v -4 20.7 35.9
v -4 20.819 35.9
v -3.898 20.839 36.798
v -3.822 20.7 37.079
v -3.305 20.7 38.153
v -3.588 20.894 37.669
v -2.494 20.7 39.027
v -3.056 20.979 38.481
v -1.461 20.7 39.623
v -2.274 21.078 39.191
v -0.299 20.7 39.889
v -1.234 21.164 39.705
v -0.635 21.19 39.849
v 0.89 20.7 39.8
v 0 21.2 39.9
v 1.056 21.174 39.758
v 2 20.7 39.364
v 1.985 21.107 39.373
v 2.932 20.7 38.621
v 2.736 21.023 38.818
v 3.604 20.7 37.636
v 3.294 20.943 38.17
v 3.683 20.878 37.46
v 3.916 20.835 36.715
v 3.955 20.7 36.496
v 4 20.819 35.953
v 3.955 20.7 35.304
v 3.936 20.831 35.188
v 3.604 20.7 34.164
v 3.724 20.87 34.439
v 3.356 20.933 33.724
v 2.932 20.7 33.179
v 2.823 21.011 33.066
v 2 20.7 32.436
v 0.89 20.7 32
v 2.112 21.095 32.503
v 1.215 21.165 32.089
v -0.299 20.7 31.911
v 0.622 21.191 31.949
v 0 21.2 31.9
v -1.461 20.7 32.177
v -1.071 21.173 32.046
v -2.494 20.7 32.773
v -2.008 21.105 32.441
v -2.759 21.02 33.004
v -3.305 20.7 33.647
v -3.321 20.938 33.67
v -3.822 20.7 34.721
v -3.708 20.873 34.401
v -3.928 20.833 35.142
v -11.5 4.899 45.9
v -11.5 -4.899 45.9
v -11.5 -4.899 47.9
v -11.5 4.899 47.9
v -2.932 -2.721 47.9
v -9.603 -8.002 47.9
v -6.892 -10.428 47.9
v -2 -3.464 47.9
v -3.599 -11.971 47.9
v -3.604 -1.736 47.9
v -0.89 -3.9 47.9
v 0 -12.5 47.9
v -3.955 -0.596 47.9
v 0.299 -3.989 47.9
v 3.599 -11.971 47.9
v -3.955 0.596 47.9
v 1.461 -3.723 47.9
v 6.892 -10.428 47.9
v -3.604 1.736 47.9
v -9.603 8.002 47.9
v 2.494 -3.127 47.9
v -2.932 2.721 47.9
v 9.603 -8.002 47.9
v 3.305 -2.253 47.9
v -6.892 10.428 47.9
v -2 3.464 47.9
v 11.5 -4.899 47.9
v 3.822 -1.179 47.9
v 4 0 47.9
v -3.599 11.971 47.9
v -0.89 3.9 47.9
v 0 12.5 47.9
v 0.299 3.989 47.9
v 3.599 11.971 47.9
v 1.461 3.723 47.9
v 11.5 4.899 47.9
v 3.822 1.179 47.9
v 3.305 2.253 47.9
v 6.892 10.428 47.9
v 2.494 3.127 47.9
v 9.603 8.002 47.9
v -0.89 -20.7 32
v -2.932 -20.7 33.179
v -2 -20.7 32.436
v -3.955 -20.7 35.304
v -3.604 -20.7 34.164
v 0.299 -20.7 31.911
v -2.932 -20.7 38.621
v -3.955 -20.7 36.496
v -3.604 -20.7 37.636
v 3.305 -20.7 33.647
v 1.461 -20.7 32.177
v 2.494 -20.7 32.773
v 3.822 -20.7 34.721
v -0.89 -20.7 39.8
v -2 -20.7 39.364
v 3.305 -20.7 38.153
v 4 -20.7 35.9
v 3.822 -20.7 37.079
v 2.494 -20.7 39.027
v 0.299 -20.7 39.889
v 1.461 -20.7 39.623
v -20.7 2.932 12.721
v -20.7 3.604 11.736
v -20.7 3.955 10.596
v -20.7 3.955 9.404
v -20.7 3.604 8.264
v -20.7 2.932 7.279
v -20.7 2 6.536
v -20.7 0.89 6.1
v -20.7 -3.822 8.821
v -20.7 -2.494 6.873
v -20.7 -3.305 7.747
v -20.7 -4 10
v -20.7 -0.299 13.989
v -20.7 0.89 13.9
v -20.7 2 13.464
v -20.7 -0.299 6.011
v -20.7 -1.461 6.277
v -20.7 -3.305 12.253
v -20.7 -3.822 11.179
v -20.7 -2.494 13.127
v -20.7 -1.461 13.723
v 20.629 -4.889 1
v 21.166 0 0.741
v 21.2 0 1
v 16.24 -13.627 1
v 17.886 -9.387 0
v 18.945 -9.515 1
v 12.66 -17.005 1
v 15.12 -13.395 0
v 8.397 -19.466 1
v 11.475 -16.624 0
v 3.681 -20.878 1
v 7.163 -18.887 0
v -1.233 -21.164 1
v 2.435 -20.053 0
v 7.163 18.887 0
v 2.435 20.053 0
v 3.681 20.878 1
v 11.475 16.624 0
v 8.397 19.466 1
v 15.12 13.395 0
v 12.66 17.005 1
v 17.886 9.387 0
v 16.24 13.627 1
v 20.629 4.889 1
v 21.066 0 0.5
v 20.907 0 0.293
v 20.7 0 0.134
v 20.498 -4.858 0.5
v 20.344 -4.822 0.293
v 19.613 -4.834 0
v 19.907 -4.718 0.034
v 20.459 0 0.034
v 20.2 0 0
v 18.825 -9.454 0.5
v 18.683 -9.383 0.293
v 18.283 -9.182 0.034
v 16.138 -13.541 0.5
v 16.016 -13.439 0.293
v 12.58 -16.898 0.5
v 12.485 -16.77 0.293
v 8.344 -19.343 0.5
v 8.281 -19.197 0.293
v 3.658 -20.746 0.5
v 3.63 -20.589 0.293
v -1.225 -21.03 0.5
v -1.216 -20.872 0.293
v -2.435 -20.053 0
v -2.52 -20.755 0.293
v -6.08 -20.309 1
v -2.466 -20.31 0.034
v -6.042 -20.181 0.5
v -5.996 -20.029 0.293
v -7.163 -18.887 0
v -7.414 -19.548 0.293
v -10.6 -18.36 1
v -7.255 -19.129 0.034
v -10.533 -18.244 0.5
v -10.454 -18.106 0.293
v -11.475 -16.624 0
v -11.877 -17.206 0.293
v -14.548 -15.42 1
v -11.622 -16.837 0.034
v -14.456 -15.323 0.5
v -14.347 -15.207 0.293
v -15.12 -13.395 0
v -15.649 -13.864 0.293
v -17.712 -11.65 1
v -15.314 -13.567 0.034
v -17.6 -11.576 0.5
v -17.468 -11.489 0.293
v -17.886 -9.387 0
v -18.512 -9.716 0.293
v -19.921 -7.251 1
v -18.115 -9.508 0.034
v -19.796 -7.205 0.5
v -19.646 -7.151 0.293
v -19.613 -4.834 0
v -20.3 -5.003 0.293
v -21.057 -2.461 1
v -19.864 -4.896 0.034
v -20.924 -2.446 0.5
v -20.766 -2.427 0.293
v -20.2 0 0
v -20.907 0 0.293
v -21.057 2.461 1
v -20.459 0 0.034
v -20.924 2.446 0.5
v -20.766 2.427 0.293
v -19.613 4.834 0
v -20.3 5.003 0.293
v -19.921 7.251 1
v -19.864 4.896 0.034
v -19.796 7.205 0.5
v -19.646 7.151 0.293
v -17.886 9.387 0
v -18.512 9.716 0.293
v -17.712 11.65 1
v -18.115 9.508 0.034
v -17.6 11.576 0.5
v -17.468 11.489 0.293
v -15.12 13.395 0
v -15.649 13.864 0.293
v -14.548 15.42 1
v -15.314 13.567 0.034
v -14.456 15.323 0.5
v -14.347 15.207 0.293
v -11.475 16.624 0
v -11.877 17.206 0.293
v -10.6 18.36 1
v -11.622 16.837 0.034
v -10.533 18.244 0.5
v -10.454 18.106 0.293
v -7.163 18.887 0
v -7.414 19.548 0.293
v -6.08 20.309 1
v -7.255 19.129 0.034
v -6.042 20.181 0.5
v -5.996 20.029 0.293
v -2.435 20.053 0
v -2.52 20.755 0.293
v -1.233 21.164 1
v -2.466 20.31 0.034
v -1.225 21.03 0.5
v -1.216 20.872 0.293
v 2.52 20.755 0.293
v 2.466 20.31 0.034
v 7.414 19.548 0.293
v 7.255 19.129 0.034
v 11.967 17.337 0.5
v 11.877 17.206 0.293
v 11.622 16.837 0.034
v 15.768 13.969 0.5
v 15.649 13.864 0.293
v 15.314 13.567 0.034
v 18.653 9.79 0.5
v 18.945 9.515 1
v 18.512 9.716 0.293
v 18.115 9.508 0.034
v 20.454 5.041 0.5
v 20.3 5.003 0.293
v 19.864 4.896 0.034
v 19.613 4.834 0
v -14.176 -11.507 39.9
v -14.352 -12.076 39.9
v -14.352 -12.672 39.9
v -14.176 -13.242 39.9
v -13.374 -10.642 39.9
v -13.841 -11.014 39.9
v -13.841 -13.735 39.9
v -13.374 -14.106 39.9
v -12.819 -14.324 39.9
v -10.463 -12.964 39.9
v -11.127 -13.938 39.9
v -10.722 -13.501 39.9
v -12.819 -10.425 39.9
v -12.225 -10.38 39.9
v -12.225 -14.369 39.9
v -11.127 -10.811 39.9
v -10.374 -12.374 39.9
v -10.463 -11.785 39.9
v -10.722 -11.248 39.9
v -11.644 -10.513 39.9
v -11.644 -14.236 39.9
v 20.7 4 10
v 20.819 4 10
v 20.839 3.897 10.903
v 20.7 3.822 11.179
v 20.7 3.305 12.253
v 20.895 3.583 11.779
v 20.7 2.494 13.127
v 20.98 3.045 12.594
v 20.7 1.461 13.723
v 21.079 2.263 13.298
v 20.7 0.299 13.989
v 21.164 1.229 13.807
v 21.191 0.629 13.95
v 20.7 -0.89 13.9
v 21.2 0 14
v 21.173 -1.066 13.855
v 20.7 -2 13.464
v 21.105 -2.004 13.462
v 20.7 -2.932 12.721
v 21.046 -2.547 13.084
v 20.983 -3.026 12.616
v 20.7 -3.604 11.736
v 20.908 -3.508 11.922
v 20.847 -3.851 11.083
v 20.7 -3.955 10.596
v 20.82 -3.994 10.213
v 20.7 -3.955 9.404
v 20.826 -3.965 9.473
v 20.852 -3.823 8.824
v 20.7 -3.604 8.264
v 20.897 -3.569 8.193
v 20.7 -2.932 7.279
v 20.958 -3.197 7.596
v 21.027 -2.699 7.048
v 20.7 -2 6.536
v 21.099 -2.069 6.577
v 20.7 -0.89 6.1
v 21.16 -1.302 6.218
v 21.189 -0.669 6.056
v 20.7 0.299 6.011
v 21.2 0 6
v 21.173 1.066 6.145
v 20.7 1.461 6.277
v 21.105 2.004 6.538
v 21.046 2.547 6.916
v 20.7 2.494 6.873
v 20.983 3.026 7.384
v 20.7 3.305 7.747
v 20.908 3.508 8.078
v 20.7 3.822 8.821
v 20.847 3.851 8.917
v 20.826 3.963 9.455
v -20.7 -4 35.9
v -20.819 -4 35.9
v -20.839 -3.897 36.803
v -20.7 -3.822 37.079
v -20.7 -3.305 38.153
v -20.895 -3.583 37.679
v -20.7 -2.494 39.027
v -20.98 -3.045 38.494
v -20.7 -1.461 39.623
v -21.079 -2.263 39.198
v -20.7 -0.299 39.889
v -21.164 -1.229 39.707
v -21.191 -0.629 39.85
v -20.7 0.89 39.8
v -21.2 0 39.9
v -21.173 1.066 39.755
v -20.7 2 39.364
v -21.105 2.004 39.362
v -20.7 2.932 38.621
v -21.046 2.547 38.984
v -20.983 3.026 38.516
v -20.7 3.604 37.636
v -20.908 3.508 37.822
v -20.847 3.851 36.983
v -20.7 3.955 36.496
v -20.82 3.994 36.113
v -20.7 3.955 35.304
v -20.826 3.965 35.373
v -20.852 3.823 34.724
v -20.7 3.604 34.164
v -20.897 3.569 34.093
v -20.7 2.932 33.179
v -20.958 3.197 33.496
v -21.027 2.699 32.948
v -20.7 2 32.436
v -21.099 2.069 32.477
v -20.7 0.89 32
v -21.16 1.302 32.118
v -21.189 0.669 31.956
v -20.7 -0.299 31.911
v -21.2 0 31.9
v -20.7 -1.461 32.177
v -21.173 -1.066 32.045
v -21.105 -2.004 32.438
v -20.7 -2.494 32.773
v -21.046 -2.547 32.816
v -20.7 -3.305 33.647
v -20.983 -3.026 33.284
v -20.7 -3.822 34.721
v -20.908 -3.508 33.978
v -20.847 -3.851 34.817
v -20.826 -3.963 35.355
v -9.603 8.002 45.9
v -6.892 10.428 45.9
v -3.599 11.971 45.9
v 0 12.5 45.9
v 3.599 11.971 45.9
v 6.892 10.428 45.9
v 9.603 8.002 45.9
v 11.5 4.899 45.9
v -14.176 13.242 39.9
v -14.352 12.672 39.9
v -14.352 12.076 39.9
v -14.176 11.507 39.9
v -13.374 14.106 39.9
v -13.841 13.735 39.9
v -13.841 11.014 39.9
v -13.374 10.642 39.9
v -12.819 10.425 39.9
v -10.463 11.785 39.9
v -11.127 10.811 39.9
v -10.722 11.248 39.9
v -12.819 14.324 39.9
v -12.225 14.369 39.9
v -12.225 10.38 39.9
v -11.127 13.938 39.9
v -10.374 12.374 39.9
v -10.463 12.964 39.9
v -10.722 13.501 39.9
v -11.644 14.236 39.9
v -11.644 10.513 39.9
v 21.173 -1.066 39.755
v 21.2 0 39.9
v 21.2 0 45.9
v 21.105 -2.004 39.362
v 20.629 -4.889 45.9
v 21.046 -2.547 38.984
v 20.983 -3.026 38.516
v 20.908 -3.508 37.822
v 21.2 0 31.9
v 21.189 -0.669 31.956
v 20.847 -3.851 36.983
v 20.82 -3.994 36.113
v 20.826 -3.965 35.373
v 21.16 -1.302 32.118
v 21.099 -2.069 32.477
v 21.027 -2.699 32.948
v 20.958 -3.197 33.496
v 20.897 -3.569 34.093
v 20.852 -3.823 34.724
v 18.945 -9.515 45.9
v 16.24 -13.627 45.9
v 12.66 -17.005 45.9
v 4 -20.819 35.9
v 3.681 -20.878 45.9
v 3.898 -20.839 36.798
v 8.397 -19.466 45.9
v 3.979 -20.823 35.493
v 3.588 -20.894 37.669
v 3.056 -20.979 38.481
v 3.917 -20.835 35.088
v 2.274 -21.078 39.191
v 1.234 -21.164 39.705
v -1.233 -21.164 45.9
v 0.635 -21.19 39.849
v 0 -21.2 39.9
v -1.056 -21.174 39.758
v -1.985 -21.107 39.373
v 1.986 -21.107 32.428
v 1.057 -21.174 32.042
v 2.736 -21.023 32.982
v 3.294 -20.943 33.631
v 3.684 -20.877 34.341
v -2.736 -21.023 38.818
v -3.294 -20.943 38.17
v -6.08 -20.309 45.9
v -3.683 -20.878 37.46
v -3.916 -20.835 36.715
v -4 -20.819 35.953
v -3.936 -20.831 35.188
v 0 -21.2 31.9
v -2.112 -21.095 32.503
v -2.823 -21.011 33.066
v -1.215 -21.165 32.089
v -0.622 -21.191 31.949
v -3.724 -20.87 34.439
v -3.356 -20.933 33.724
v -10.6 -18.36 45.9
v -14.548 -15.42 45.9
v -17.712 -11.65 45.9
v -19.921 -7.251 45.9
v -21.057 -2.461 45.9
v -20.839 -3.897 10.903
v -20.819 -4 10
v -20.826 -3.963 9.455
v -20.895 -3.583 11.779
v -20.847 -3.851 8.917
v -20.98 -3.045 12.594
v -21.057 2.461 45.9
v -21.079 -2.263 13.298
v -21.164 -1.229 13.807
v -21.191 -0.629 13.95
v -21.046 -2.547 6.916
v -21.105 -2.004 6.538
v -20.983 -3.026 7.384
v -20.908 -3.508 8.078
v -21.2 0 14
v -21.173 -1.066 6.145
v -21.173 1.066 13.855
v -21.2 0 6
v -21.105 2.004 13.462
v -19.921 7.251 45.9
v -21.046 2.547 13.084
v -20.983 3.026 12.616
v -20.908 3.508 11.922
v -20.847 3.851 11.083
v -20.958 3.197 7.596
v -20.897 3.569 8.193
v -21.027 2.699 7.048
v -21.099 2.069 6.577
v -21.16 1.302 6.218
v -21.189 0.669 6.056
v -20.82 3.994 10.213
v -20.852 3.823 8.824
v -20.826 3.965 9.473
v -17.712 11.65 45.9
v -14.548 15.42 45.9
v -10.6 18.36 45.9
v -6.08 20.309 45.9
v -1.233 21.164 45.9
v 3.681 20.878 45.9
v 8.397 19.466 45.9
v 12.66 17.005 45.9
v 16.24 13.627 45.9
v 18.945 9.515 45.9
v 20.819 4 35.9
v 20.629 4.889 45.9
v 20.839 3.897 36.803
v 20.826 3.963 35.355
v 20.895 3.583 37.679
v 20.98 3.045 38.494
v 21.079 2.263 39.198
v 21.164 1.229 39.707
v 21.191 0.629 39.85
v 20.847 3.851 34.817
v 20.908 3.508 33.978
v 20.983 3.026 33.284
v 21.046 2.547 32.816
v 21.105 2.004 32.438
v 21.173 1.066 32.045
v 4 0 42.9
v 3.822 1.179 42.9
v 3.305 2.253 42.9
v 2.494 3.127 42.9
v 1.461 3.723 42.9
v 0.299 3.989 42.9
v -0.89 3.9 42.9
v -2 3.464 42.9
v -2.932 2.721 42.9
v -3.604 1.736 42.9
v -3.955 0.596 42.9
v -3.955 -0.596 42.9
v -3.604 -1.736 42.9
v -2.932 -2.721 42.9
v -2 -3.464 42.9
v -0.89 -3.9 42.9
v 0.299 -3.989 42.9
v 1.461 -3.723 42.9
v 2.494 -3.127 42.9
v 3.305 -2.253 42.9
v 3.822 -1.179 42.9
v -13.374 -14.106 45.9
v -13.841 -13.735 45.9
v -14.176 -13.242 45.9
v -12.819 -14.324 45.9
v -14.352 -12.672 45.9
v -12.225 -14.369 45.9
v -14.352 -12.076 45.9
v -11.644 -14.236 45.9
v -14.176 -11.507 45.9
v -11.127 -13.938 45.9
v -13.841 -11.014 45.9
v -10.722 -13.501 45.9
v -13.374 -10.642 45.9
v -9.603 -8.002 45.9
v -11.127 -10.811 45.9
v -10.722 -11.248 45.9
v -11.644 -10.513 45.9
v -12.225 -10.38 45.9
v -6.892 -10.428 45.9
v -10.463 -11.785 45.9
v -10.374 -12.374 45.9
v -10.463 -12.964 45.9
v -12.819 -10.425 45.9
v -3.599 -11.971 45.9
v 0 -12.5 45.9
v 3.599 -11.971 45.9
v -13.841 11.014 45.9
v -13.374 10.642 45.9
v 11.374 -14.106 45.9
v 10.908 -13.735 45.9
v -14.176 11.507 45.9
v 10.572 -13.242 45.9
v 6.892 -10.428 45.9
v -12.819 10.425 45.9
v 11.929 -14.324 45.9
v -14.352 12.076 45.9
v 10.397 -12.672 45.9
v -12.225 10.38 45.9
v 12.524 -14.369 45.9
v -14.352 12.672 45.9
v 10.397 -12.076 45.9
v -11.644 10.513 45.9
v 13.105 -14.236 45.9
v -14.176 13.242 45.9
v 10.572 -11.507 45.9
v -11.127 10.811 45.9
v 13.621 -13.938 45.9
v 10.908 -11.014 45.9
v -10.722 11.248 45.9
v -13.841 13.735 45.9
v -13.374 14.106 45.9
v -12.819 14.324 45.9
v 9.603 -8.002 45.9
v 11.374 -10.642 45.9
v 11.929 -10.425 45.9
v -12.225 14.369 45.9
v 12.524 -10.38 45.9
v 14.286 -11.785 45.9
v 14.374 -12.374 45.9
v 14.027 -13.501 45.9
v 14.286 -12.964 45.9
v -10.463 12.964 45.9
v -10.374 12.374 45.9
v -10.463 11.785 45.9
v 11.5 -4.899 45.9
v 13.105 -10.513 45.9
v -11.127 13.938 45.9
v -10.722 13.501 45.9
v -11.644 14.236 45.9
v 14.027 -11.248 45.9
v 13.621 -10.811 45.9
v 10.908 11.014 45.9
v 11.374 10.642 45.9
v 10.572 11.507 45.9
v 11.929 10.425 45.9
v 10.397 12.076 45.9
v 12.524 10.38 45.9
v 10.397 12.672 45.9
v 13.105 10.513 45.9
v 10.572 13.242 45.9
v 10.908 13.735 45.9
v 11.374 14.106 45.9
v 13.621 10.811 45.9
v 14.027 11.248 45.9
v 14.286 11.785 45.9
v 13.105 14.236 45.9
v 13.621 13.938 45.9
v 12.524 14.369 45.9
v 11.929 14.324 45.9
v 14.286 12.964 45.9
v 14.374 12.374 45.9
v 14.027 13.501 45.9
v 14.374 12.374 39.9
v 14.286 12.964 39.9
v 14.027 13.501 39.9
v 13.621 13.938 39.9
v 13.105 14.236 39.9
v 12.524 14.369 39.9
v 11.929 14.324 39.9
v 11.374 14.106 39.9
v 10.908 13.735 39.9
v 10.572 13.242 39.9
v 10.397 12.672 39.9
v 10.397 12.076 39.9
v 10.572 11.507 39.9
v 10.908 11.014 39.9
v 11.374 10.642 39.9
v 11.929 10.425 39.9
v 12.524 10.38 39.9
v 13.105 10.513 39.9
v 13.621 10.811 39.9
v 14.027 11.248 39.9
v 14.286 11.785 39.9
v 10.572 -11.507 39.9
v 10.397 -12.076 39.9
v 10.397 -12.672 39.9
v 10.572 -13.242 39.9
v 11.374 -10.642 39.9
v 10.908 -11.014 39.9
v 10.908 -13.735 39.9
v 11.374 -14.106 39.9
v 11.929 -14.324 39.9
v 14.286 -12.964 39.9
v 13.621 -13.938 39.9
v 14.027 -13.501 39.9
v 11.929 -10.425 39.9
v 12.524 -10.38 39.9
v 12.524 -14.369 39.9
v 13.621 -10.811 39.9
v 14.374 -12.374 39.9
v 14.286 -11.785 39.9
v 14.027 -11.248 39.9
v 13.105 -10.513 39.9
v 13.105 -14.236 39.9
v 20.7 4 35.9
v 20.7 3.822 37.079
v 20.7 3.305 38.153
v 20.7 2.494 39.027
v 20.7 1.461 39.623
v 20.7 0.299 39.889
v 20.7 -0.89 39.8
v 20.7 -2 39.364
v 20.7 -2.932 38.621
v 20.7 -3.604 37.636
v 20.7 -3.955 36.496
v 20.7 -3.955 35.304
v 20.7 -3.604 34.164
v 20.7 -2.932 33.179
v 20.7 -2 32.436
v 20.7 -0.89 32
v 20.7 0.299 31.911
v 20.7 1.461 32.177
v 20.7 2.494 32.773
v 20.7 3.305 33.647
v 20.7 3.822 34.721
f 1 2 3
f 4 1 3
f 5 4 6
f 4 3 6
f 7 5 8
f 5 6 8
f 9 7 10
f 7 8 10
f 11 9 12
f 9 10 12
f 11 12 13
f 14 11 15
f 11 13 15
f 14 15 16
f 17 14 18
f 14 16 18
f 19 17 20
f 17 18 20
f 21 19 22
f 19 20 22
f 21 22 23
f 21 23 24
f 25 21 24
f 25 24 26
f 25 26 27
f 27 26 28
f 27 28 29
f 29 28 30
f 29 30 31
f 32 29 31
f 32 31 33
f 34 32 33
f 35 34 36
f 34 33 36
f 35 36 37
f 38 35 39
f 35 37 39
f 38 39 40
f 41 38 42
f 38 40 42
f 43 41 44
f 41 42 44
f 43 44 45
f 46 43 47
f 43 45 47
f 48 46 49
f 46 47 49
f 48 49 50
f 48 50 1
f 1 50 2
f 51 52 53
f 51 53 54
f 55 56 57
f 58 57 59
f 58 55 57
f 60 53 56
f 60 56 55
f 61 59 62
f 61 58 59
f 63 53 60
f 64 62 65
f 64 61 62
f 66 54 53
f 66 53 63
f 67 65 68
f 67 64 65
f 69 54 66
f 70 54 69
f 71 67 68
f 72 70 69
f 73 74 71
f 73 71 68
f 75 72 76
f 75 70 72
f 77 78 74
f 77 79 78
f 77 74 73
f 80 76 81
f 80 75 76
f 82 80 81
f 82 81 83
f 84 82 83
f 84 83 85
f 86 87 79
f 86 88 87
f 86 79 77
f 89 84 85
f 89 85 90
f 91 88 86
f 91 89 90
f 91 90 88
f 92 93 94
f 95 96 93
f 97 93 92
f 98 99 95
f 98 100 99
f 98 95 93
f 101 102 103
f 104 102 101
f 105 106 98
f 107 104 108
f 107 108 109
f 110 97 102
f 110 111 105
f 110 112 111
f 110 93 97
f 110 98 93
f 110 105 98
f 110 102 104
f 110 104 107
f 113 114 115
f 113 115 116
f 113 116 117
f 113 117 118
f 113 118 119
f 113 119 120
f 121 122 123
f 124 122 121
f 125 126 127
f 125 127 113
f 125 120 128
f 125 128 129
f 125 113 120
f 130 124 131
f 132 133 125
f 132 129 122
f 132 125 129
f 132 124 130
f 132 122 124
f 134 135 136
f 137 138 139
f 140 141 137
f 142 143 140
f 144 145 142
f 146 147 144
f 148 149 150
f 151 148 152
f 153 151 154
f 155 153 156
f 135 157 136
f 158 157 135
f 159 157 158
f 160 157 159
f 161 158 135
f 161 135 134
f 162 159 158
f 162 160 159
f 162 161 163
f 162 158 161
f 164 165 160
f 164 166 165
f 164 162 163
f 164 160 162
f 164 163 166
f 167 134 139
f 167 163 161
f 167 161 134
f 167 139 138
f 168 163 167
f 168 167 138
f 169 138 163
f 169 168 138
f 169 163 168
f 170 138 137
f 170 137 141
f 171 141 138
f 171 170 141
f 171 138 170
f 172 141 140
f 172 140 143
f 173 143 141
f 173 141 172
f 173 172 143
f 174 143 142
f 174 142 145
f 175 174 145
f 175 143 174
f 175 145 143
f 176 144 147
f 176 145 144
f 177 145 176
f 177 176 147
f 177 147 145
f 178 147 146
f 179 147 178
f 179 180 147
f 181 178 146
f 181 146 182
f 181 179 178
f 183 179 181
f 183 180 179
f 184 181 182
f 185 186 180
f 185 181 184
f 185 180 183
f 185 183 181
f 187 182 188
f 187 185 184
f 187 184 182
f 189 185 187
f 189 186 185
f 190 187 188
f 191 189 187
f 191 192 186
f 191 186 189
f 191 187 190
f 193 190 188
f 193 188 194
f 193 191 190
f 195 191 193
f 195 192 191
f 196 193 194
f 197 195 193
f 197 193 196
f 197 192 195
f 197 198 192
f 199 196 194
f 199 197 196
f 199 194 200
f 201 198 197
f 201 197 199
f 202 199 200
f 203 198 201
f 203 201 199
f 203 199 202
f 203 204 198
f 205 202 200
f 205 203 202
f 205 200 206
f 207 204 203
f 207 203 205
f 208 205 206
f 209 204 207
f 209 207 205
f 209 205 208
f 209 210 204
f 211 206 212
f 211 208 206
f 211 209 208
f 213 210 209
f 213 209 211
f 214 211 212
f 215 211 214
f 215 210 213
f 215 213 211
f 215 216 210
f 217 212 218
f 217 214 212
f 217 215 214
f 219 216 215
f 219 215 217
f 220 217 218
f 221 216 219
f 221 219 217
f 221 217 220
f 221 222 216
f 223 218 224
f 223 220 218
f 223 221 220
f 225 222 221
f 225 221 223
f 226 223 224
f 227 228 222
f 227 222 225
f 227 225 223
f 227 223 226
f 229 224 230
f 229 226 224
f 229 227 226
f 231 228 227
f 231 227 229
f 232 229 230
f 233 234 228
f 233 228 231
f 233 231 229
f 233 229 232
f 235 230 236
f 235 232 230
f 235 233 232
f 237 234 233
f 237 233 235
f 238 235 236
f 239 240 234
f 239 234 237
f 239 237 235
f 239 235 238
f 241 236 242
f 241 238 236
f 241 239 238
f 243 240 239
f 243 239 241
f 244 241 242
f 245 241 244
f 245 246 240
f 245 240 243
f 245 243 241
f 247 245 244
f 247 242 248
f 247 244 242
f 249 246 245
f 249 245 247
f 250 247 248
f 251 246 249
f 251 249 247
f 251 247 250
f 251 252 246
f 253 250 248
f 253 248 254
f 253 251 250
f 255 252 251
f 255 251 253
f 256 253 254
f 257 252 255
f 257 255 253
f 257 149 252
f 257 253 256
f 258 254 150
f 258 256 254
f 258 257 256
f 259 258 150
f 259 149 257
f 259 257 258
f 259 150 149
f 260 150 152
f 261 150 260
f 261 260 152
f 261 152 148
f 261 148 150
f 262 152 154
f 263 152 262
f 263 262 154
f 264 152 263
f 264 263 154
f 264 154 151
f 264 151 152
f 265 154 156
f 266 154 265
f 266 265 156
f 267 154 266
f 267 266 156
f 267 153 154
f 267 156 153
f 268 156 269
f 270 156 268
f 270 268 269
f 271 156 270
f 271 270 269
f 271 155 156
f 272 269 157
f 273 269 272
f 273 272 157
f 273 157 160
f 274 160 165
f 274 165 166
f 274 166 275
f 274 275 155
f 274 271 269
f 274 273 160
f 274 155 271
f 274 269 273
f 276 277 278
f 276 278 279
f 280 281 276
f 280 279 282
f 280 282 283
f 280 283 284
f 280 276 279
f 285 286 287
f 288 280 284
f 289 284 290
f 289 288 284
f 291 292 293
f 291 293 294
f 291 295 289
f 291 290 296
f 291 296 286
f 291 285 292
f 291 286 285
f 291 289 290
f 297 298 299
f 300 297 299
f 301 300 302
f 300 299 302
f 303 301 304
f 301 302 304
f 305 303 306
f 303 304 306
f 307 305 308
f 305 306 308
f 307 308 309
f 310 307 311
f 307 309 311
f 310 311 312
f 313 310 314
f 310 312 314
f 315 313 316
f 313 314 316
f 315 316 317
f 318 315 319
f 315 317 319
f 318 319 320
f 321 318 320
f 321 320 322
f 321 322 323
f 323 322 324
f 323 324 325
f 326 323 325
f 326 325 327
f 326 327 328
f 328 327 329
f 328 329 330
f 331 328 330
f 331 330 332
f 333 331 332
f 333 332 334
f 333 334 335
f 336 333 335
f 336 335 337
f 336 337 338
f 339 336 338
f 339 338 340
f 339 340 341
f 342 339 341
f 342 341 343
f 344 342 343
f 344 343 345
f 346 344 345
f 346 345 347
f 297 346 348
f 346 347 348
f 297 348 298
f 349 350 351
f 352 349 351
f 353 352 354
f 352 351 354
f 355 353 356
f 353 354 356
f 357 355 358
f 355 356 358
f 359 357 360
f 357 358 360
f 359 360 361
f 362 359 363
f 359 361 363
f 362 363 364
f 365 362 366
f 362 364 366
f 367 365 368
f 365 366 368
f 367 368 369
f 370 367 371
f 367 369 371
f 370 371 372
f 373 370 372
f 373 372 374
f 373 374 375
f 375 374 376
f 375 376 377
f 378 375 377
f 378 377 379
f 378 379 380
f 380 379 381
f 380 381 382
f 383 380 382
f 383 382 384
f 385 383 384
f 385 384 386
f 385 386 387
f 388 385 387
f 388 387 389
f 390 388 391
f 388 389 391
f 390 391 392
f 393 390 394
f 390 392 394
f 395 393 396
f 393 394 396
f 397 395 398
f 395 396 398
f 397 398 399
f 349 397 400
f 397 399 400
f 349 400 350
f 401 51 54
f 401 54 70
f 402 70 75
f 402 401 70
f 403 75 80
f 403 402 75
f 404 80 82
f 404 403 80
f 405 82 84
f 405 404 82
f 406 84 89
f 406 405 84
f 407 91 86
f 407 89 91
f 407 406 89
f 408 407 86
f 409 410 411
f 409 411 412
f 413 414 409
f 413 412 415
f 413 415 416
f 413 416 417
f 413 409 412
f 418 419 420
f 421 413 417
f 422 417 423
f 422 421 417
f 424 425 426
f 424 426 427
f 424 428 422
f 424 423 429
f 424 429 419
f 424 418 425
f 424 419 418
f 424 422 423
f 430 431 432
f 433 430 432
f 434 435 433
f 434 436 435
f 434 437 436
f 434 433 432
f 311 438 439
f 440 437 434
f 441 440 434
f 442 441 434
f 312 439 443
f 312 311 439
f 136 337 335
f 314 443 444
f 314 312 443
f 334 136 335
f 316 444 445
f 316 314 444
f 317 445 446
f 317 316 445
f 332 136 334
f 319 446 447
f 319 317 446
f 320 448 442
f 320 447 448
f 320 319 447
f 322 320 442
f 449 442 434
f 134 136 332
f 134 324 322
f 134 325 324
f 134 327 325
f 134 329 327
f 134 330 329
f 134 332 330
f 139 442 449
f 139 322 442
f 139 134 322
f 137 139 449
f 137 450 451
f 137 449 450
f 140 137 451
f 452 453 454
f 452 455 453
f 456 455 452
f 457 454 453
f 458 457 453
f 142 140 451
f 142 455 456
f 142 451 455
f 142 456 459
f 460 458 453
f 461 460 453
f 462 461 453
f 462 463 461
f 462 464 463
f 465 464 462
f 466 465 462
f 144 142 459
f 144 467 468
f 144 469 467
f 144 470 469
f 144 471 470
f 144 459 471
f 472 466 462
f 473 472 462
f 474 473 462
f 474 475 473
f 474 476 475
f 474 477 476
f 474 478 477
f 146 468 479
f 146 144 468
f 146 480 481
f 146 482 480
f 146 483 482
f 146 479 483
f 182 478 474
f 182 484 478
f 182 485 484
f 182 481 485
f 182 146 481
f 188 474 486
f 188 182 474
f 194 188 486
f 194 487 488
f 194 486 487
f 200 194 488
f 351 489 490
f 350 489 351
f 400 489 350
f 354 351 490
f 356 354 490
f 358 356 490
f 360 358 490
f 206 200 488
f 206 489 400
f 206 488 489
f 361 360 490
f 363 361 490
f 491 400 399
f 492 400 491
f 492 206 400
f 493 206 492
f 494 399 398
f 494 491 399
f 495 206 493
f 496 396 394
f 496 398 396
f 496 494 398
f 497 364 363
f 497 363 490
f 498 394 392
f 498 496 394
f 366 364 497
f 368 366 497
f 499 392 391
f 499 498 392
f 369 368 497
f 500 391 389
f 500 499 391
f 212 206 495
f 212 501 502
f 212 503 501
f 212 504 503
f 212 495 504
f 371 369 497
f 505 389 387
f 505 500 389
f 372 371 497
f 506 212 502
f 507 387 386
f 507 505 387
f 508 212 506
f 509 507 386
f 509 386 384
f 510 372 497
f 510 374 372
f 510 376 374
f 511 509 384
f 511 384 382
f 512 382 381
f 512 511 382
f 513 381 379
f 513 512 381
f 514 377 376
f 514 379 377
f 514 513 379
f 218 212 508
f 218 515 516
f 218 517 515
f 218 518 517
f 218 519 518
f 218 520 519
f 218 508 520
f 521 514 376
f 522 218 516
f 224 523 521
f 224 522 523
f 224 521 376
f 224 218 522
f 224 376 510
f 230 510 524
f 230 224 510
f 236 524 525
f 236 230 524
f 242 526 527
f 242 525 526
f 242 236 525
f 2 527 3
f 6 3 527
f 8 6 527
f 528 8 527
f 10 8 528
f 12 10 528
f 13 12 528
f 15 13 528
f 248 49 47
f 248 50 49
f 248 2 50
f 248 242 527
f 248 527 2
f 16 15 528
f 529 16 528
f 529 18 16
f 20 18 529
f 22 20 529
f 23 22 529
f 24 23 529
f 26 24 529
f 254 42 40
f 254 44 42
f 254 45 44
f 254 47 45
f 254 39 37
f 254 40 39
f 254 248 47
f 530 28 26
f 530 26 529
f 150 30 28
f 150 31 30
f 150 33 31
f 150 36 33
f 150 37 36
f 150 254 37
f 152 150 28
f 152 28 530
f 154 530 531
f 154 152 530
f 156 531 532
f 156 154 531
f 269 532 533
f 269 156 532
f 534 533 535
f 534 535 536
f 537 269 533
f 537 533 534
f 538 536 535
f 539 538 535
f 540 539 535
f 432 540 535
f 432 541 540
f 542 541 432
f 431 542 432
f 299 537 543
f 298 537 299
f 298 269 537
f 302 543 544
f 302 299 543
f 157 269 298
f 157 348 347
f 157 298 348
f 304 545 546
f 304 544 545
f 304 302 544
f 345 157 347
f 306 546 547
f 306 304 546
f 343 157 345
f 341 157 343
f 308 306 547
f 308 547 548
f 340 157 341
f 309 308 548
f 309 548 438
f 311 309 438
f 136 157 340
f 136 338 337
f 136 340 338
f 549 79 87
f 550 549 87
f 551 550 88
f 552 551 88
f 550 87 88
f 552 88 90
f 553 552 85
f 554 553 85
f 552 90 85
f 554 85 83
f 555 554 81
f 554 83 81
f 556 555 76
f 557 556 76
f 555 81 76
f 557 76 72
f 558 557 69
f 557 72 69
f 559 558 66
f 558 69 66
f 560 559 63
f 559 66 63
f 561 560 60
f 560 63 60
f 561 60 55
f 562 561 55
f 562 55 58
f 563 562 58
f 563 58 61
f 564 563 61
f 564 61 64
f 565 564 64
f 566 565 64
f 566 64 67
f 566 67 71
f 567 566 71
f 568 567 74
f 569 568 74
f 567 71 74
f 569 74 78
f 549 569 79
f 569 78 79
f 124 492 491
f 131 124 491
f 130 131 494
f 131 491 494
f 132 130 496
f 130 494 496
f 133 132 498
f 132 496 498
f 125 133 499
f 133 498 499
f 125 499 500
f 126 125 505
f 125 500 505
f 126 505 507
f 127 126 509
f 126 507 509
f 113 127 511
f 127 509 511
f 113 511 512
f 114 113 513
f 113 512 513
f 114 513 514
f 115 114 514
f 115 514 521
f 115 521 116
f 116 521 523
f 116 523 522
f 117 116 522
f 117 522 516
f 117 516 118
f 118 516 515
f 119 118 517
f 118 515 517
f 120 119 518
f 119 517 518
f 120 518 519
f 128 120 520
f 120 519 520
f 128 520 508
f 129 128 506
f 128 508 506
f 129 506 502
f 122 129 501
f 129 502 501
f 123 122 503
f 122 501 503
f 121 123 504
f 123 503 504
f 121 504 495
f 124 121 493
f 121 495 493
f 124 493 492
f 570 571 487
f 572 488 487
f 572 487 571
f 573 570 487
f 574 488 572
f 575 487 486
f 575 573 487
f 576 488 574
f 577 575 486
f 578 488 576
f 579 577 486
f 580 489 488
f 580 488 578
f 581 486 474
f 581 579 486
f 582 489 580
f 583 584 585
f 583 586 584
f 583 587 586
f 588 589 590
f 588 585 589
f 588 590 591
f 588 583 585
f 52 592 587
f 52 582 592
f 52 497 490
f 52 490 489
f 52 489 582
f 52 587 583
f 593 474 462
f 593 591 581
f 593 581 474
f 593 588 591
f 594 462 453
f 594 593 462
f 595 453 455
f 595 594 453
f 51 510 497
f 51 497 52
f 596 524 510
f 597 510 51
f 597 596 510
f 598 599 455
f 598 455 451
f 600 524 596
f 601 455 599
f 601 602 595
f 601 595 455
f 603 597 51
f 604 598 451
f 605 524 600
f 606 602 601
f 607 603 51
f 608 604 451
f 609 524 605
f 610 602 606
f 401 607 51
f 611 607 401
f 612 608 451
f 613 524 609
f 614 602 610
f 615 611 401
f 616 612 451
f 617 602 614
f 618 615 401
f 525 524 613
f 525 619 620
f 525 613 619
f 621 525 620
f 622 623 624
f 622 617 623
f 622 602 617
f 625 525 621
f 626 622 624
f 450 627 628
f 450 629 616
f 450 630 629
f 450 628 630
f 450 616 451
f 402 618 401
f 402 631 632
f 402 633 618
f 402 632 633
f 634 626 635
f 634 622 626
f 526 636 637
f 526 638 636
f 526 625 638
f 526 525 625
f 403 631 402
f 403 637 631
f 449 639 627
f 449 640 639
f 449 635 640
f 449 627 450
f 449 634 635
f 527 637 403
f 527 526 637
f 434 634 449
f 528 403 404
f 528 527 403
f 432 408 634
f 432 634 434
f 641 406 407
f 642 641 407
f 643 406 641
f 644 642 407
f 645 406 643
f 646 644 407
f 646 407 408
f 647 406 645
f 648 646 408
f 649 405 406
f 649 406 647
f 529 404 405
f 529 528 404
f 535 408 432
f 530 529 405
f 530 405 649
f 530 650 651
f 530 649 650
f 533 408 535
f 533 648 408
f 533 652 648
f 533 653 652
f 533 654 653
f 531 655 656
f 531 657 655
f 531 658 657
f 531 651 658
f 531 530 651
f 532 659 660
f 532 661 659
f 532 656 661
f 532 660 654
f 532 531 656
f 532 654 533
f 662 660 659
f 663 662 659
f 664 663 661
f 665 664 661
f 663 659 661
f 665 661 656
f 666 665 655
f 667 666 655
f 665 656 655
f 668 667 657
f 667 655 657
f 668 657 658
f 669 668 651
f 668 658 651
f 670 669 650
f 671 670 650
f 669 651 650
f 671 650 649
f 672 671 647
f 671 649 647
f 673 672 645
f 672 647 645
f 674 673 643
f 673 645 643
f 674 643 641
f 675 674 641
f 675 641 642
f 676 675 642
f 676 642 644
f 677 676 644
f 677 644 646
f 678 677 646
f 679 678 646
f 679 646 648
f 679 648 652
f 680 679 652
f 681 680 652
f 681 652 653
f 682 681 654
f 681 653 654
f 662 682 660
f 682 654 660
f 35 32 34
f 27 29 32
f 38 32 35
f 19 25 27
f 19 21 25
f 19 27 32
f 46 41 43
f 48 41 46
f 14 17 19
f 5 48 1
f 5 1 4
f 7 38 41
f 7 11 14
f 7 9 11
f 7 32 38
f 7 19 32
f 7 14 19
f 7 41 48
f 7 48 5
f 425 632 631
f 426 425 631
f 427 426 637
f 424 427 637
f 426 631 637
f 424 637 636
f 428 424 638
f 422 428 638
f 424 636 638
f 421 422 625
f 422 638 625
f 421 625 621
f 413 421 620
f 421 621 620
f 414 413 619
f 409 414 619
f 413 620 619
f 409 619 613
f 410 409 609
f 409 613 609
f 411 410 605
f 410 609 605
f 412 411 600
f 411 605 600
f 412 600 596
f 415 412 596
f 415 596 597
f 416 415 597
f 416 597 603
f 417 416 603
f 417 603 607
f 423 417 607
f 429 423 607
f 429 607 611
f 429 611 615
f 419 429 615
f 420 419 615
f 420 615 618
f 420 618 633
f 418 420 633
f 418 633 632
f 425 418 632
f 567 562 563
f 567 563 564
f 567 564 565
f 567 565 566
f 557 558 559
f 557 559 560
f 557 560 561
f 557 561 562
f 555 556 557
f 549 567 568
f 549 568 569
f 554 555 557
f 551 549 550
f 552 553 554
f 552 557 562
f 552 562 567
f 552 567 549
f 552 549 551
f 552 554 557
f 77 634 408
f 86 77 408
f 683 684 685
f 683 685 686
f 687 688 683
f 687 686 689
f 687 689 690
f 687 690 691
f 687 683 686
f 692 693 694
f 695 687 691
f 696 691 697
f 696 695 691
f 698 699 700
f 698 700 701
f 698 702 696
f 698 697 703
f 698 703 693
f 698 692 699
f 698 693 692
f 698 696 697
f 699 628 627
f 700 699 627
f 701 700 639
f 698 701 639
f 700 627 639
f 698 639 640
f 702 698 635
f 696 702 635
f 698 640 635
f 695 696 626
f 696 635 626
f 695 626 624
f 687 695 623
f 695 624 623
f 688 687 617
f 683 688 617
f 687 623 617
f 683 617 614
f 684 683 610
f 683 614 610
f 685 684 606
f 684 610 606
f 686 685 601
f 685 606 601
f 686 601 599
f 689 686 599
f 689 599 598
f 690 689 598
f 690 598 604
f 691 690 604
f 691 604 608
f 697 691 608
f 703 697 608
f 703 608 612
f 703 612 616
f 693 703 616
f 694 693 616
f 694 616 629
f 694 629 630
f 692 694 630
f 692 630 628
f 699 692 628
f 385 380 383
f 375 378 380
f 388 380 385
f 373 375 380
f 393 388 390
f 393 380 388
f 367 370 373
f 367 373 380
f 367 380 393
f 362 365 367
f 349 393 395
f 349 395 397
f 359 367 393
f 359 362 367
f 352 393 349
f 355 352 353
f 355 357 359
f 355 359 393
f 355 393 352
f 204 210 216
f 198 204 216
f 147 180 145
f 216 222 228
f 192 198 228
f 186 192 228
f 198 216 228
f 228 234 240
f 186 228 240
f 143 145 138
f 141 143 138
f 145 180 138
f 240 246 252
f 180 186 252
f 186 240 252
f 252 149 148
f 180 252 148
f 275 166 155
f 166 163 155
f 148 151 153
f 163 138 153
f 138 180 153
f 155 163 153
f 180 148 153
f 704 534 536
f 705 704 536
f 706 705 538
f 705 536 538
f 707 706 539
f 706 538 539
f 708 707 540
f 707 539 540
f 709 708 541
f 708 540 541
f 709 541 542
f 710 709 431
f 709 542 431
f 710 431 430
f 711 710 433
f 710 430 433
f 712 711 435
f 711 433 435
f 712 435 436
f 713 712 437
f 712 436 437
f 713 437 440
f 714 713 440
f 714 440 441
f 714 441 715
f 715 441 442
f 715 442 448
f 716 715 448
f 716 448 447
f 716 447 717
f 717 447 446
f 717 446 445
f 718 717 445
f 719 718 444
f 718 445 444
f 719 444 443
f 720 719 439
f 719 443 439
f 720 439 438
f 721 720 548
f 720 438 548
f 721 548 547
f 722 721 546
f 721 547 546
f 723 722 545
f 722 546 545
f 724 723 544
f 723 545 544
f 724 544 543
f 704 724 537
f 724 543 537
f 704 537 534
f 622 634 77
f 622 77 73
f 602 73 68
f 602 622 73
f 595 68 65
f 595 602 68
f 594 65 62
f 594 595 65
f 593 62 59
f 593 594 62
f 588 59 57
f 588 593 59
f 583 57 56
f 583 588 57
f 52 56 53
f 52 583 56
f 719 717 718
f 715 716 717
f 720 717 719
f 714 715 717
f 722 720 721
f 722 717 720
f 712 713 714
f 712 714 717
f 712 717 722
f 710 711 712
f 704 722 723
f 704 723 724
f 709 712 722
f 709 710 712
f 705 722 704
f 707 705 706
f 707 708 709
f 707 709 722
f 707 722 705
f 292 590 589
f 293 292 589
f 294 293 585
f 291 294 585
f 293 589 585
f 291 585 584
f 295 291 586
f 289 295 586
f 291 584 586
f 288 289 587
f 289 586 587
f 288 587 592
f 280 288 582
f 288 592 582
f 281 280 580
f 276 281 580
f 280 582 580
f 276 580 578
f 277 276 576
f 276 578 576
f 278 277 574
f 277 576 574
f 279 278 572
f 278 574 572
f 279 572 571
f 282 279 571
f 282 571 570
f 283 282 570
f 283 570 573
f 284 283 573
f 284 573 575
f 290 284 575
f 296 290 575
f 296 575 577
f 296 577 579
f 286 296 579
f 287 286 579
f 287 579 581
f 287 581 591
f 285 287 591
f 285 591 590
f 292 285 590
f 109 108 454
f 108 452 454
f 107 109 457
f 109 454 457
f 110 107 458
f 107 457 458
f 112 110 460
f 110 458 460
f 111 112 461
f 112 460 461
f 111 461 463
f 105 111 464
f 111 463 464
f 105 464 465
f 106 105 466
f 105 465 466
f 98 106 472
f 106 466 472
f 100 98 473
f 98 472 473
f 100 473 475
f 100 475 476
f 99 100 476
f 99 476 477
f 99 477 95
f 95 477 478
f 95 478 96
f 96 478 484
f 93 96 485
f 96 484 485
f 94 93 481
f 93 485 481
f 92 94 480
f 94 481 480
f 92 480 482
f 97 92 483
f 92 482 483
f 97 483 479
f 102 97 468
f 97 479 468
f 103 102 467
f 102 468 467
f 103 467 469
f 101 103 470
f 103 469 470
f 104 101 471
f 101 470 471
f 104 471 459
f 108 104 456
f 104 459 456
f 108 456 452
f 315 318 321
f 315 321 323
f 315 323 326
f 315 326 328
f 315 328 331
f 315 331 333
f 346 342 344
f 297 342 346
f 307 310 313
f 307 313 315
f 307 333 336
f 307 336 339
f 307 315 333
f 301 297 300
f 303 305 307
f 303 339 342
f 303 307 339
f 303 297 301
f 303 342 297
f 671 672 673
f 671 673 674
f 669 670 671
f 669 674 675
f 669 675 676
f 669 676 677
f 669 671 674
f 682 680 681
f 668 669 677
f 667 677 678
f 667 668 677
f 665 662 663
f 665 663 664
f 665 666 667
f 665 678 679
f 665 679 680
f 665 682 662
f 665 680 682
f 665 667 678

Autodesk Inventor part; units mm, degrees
ref_plane "YZ Plane" through (0, 0, 0) normal (1, 0, 0) x (0, 1, 0)
sketch "스케치1" plane through (0, 0, 0) normal (0, 0, 1) x (1, 0, 0)
  circle A0 centre (0, 0) radius 21.2
  dimension "d0" = 42.4
extrude "돌출1" add sketch "스케치1" along normal blind 45.9
sketch "스케치2" plane through (0, 0, 45.9) normal (0, 0, 1) x (1, 0, 0)
  circle A0 centre (0, 0) radius 12.5
  line L0 (-11.5, -4.899) -> (-11.5, 4.899)
  line L1 (11.5, -4.899) -> (11.5, 4.899)
  line L2 (0, 0) -> (17.5, 0) construction
  circle A1 centre (12.3744, -12.3744) radius 2
  circle A2 centre (12.3744, 12.3744) radius 2
  circle A3 centre (-12.3744, 12.3744) radius 2
  circle A4 centre (-12.3744, -12.3744) radius 2
  dimension "d5" = 360
extrude "돌출2" cut sketch "스케치2" against normal blind 6 contours A1 | A2 | A3 | A4
sketch "스케치3" plane through (0, 0, 45.9) normal (0, 0, 1) x (1, 0, 0)
  circle A0 centre (0, 0) radius 12.5
  line L0 (-11.5, -4.899) -> (-11.5, 4.899)
  line L1 (11.5, -4.899) -> (11.5, 4.899)
  line L2 (0, 0) -> (17.5, 0) construction
  circle A1 centre (12.3744, -12.3744) radius 2
  circle A2 centre (12.3744, 12.3744) radius 2
  circle A3 centre (-12.3744, 12.3744) radius 2
  circle A4 centre (-12.3744, -12.3744) radius 2
  dimension "d10" = 360
extrude "돌출3" add sketch "스케치3" along normal blind 2 contours L1 A0 L0
sketch "스케치4" plane through (0, 0, 47.9) normal (0, 0, 1) x (1, 0, 0)
  circle A0 centre (0, 0) radius 4
  dimension "d13" = 8
extrude "돌출4" cut sketch "스케치4" against normal blind 5
ref_plane "작업 평면1" through (21.2, 0, 0) normal (1, 0, 0) x (0, 1, 0)
sketch "스케치5" plane through (21.2, 0, 0) normal (1, 0, 0) x (0, 1, 0)
  line L0 (21.2, 45.9) -> (-21.2, 45.9) projected
  line L1 (21.2, 0) -> (-21.2, 0) projected
  line L2 (-4.899, 45.9) -> (4.899, 45.9) projected
  line L3 (0, 45.9) -> (0, 35.9)
  line L4 (0, 35.9) -> (0, 10)
  circle A0 centre (0, 10) radius 4
  circle A1 centre (0, 35.9) radius 4
  point P0 (0, 0)
  dimension "d16" = 10
  dimension "d17" = 25.9
  dimension "d18" = 8
extrude "돌출5" cut sketch "스케치5" against normal blind 0.5
ref_plane "작업 평면5" through (0, 21.2, 0) normal (0, 1, 0) x (-1, 0, 0)
sketch "스케치7" plane through (0, 21.2, 0) normal (0, 1, 0) x (-1, 0, 0)
  line L0 (0, 0) -> (0, 35.9)
  line L1 (-11.5, 45.9) -> (11.5, 45.9) projected
  circle A0 centre (0, 35.9) radius 4
  dimension "d28" = 35.9
  dimension "d29" = 8
extrude "돌출7" cut sketch "스케치7" against normal blind 0.5
pattern_circular "원형 패턴2" count 2 over 360 about axis through (0, 0, 0) along (0, 0, 1) of "돌출5", "돌출7"
fillet "모깎기1" radius 1 1 edges at (-21.2, 0, 0)
properties part number "gear(49ratio)"
